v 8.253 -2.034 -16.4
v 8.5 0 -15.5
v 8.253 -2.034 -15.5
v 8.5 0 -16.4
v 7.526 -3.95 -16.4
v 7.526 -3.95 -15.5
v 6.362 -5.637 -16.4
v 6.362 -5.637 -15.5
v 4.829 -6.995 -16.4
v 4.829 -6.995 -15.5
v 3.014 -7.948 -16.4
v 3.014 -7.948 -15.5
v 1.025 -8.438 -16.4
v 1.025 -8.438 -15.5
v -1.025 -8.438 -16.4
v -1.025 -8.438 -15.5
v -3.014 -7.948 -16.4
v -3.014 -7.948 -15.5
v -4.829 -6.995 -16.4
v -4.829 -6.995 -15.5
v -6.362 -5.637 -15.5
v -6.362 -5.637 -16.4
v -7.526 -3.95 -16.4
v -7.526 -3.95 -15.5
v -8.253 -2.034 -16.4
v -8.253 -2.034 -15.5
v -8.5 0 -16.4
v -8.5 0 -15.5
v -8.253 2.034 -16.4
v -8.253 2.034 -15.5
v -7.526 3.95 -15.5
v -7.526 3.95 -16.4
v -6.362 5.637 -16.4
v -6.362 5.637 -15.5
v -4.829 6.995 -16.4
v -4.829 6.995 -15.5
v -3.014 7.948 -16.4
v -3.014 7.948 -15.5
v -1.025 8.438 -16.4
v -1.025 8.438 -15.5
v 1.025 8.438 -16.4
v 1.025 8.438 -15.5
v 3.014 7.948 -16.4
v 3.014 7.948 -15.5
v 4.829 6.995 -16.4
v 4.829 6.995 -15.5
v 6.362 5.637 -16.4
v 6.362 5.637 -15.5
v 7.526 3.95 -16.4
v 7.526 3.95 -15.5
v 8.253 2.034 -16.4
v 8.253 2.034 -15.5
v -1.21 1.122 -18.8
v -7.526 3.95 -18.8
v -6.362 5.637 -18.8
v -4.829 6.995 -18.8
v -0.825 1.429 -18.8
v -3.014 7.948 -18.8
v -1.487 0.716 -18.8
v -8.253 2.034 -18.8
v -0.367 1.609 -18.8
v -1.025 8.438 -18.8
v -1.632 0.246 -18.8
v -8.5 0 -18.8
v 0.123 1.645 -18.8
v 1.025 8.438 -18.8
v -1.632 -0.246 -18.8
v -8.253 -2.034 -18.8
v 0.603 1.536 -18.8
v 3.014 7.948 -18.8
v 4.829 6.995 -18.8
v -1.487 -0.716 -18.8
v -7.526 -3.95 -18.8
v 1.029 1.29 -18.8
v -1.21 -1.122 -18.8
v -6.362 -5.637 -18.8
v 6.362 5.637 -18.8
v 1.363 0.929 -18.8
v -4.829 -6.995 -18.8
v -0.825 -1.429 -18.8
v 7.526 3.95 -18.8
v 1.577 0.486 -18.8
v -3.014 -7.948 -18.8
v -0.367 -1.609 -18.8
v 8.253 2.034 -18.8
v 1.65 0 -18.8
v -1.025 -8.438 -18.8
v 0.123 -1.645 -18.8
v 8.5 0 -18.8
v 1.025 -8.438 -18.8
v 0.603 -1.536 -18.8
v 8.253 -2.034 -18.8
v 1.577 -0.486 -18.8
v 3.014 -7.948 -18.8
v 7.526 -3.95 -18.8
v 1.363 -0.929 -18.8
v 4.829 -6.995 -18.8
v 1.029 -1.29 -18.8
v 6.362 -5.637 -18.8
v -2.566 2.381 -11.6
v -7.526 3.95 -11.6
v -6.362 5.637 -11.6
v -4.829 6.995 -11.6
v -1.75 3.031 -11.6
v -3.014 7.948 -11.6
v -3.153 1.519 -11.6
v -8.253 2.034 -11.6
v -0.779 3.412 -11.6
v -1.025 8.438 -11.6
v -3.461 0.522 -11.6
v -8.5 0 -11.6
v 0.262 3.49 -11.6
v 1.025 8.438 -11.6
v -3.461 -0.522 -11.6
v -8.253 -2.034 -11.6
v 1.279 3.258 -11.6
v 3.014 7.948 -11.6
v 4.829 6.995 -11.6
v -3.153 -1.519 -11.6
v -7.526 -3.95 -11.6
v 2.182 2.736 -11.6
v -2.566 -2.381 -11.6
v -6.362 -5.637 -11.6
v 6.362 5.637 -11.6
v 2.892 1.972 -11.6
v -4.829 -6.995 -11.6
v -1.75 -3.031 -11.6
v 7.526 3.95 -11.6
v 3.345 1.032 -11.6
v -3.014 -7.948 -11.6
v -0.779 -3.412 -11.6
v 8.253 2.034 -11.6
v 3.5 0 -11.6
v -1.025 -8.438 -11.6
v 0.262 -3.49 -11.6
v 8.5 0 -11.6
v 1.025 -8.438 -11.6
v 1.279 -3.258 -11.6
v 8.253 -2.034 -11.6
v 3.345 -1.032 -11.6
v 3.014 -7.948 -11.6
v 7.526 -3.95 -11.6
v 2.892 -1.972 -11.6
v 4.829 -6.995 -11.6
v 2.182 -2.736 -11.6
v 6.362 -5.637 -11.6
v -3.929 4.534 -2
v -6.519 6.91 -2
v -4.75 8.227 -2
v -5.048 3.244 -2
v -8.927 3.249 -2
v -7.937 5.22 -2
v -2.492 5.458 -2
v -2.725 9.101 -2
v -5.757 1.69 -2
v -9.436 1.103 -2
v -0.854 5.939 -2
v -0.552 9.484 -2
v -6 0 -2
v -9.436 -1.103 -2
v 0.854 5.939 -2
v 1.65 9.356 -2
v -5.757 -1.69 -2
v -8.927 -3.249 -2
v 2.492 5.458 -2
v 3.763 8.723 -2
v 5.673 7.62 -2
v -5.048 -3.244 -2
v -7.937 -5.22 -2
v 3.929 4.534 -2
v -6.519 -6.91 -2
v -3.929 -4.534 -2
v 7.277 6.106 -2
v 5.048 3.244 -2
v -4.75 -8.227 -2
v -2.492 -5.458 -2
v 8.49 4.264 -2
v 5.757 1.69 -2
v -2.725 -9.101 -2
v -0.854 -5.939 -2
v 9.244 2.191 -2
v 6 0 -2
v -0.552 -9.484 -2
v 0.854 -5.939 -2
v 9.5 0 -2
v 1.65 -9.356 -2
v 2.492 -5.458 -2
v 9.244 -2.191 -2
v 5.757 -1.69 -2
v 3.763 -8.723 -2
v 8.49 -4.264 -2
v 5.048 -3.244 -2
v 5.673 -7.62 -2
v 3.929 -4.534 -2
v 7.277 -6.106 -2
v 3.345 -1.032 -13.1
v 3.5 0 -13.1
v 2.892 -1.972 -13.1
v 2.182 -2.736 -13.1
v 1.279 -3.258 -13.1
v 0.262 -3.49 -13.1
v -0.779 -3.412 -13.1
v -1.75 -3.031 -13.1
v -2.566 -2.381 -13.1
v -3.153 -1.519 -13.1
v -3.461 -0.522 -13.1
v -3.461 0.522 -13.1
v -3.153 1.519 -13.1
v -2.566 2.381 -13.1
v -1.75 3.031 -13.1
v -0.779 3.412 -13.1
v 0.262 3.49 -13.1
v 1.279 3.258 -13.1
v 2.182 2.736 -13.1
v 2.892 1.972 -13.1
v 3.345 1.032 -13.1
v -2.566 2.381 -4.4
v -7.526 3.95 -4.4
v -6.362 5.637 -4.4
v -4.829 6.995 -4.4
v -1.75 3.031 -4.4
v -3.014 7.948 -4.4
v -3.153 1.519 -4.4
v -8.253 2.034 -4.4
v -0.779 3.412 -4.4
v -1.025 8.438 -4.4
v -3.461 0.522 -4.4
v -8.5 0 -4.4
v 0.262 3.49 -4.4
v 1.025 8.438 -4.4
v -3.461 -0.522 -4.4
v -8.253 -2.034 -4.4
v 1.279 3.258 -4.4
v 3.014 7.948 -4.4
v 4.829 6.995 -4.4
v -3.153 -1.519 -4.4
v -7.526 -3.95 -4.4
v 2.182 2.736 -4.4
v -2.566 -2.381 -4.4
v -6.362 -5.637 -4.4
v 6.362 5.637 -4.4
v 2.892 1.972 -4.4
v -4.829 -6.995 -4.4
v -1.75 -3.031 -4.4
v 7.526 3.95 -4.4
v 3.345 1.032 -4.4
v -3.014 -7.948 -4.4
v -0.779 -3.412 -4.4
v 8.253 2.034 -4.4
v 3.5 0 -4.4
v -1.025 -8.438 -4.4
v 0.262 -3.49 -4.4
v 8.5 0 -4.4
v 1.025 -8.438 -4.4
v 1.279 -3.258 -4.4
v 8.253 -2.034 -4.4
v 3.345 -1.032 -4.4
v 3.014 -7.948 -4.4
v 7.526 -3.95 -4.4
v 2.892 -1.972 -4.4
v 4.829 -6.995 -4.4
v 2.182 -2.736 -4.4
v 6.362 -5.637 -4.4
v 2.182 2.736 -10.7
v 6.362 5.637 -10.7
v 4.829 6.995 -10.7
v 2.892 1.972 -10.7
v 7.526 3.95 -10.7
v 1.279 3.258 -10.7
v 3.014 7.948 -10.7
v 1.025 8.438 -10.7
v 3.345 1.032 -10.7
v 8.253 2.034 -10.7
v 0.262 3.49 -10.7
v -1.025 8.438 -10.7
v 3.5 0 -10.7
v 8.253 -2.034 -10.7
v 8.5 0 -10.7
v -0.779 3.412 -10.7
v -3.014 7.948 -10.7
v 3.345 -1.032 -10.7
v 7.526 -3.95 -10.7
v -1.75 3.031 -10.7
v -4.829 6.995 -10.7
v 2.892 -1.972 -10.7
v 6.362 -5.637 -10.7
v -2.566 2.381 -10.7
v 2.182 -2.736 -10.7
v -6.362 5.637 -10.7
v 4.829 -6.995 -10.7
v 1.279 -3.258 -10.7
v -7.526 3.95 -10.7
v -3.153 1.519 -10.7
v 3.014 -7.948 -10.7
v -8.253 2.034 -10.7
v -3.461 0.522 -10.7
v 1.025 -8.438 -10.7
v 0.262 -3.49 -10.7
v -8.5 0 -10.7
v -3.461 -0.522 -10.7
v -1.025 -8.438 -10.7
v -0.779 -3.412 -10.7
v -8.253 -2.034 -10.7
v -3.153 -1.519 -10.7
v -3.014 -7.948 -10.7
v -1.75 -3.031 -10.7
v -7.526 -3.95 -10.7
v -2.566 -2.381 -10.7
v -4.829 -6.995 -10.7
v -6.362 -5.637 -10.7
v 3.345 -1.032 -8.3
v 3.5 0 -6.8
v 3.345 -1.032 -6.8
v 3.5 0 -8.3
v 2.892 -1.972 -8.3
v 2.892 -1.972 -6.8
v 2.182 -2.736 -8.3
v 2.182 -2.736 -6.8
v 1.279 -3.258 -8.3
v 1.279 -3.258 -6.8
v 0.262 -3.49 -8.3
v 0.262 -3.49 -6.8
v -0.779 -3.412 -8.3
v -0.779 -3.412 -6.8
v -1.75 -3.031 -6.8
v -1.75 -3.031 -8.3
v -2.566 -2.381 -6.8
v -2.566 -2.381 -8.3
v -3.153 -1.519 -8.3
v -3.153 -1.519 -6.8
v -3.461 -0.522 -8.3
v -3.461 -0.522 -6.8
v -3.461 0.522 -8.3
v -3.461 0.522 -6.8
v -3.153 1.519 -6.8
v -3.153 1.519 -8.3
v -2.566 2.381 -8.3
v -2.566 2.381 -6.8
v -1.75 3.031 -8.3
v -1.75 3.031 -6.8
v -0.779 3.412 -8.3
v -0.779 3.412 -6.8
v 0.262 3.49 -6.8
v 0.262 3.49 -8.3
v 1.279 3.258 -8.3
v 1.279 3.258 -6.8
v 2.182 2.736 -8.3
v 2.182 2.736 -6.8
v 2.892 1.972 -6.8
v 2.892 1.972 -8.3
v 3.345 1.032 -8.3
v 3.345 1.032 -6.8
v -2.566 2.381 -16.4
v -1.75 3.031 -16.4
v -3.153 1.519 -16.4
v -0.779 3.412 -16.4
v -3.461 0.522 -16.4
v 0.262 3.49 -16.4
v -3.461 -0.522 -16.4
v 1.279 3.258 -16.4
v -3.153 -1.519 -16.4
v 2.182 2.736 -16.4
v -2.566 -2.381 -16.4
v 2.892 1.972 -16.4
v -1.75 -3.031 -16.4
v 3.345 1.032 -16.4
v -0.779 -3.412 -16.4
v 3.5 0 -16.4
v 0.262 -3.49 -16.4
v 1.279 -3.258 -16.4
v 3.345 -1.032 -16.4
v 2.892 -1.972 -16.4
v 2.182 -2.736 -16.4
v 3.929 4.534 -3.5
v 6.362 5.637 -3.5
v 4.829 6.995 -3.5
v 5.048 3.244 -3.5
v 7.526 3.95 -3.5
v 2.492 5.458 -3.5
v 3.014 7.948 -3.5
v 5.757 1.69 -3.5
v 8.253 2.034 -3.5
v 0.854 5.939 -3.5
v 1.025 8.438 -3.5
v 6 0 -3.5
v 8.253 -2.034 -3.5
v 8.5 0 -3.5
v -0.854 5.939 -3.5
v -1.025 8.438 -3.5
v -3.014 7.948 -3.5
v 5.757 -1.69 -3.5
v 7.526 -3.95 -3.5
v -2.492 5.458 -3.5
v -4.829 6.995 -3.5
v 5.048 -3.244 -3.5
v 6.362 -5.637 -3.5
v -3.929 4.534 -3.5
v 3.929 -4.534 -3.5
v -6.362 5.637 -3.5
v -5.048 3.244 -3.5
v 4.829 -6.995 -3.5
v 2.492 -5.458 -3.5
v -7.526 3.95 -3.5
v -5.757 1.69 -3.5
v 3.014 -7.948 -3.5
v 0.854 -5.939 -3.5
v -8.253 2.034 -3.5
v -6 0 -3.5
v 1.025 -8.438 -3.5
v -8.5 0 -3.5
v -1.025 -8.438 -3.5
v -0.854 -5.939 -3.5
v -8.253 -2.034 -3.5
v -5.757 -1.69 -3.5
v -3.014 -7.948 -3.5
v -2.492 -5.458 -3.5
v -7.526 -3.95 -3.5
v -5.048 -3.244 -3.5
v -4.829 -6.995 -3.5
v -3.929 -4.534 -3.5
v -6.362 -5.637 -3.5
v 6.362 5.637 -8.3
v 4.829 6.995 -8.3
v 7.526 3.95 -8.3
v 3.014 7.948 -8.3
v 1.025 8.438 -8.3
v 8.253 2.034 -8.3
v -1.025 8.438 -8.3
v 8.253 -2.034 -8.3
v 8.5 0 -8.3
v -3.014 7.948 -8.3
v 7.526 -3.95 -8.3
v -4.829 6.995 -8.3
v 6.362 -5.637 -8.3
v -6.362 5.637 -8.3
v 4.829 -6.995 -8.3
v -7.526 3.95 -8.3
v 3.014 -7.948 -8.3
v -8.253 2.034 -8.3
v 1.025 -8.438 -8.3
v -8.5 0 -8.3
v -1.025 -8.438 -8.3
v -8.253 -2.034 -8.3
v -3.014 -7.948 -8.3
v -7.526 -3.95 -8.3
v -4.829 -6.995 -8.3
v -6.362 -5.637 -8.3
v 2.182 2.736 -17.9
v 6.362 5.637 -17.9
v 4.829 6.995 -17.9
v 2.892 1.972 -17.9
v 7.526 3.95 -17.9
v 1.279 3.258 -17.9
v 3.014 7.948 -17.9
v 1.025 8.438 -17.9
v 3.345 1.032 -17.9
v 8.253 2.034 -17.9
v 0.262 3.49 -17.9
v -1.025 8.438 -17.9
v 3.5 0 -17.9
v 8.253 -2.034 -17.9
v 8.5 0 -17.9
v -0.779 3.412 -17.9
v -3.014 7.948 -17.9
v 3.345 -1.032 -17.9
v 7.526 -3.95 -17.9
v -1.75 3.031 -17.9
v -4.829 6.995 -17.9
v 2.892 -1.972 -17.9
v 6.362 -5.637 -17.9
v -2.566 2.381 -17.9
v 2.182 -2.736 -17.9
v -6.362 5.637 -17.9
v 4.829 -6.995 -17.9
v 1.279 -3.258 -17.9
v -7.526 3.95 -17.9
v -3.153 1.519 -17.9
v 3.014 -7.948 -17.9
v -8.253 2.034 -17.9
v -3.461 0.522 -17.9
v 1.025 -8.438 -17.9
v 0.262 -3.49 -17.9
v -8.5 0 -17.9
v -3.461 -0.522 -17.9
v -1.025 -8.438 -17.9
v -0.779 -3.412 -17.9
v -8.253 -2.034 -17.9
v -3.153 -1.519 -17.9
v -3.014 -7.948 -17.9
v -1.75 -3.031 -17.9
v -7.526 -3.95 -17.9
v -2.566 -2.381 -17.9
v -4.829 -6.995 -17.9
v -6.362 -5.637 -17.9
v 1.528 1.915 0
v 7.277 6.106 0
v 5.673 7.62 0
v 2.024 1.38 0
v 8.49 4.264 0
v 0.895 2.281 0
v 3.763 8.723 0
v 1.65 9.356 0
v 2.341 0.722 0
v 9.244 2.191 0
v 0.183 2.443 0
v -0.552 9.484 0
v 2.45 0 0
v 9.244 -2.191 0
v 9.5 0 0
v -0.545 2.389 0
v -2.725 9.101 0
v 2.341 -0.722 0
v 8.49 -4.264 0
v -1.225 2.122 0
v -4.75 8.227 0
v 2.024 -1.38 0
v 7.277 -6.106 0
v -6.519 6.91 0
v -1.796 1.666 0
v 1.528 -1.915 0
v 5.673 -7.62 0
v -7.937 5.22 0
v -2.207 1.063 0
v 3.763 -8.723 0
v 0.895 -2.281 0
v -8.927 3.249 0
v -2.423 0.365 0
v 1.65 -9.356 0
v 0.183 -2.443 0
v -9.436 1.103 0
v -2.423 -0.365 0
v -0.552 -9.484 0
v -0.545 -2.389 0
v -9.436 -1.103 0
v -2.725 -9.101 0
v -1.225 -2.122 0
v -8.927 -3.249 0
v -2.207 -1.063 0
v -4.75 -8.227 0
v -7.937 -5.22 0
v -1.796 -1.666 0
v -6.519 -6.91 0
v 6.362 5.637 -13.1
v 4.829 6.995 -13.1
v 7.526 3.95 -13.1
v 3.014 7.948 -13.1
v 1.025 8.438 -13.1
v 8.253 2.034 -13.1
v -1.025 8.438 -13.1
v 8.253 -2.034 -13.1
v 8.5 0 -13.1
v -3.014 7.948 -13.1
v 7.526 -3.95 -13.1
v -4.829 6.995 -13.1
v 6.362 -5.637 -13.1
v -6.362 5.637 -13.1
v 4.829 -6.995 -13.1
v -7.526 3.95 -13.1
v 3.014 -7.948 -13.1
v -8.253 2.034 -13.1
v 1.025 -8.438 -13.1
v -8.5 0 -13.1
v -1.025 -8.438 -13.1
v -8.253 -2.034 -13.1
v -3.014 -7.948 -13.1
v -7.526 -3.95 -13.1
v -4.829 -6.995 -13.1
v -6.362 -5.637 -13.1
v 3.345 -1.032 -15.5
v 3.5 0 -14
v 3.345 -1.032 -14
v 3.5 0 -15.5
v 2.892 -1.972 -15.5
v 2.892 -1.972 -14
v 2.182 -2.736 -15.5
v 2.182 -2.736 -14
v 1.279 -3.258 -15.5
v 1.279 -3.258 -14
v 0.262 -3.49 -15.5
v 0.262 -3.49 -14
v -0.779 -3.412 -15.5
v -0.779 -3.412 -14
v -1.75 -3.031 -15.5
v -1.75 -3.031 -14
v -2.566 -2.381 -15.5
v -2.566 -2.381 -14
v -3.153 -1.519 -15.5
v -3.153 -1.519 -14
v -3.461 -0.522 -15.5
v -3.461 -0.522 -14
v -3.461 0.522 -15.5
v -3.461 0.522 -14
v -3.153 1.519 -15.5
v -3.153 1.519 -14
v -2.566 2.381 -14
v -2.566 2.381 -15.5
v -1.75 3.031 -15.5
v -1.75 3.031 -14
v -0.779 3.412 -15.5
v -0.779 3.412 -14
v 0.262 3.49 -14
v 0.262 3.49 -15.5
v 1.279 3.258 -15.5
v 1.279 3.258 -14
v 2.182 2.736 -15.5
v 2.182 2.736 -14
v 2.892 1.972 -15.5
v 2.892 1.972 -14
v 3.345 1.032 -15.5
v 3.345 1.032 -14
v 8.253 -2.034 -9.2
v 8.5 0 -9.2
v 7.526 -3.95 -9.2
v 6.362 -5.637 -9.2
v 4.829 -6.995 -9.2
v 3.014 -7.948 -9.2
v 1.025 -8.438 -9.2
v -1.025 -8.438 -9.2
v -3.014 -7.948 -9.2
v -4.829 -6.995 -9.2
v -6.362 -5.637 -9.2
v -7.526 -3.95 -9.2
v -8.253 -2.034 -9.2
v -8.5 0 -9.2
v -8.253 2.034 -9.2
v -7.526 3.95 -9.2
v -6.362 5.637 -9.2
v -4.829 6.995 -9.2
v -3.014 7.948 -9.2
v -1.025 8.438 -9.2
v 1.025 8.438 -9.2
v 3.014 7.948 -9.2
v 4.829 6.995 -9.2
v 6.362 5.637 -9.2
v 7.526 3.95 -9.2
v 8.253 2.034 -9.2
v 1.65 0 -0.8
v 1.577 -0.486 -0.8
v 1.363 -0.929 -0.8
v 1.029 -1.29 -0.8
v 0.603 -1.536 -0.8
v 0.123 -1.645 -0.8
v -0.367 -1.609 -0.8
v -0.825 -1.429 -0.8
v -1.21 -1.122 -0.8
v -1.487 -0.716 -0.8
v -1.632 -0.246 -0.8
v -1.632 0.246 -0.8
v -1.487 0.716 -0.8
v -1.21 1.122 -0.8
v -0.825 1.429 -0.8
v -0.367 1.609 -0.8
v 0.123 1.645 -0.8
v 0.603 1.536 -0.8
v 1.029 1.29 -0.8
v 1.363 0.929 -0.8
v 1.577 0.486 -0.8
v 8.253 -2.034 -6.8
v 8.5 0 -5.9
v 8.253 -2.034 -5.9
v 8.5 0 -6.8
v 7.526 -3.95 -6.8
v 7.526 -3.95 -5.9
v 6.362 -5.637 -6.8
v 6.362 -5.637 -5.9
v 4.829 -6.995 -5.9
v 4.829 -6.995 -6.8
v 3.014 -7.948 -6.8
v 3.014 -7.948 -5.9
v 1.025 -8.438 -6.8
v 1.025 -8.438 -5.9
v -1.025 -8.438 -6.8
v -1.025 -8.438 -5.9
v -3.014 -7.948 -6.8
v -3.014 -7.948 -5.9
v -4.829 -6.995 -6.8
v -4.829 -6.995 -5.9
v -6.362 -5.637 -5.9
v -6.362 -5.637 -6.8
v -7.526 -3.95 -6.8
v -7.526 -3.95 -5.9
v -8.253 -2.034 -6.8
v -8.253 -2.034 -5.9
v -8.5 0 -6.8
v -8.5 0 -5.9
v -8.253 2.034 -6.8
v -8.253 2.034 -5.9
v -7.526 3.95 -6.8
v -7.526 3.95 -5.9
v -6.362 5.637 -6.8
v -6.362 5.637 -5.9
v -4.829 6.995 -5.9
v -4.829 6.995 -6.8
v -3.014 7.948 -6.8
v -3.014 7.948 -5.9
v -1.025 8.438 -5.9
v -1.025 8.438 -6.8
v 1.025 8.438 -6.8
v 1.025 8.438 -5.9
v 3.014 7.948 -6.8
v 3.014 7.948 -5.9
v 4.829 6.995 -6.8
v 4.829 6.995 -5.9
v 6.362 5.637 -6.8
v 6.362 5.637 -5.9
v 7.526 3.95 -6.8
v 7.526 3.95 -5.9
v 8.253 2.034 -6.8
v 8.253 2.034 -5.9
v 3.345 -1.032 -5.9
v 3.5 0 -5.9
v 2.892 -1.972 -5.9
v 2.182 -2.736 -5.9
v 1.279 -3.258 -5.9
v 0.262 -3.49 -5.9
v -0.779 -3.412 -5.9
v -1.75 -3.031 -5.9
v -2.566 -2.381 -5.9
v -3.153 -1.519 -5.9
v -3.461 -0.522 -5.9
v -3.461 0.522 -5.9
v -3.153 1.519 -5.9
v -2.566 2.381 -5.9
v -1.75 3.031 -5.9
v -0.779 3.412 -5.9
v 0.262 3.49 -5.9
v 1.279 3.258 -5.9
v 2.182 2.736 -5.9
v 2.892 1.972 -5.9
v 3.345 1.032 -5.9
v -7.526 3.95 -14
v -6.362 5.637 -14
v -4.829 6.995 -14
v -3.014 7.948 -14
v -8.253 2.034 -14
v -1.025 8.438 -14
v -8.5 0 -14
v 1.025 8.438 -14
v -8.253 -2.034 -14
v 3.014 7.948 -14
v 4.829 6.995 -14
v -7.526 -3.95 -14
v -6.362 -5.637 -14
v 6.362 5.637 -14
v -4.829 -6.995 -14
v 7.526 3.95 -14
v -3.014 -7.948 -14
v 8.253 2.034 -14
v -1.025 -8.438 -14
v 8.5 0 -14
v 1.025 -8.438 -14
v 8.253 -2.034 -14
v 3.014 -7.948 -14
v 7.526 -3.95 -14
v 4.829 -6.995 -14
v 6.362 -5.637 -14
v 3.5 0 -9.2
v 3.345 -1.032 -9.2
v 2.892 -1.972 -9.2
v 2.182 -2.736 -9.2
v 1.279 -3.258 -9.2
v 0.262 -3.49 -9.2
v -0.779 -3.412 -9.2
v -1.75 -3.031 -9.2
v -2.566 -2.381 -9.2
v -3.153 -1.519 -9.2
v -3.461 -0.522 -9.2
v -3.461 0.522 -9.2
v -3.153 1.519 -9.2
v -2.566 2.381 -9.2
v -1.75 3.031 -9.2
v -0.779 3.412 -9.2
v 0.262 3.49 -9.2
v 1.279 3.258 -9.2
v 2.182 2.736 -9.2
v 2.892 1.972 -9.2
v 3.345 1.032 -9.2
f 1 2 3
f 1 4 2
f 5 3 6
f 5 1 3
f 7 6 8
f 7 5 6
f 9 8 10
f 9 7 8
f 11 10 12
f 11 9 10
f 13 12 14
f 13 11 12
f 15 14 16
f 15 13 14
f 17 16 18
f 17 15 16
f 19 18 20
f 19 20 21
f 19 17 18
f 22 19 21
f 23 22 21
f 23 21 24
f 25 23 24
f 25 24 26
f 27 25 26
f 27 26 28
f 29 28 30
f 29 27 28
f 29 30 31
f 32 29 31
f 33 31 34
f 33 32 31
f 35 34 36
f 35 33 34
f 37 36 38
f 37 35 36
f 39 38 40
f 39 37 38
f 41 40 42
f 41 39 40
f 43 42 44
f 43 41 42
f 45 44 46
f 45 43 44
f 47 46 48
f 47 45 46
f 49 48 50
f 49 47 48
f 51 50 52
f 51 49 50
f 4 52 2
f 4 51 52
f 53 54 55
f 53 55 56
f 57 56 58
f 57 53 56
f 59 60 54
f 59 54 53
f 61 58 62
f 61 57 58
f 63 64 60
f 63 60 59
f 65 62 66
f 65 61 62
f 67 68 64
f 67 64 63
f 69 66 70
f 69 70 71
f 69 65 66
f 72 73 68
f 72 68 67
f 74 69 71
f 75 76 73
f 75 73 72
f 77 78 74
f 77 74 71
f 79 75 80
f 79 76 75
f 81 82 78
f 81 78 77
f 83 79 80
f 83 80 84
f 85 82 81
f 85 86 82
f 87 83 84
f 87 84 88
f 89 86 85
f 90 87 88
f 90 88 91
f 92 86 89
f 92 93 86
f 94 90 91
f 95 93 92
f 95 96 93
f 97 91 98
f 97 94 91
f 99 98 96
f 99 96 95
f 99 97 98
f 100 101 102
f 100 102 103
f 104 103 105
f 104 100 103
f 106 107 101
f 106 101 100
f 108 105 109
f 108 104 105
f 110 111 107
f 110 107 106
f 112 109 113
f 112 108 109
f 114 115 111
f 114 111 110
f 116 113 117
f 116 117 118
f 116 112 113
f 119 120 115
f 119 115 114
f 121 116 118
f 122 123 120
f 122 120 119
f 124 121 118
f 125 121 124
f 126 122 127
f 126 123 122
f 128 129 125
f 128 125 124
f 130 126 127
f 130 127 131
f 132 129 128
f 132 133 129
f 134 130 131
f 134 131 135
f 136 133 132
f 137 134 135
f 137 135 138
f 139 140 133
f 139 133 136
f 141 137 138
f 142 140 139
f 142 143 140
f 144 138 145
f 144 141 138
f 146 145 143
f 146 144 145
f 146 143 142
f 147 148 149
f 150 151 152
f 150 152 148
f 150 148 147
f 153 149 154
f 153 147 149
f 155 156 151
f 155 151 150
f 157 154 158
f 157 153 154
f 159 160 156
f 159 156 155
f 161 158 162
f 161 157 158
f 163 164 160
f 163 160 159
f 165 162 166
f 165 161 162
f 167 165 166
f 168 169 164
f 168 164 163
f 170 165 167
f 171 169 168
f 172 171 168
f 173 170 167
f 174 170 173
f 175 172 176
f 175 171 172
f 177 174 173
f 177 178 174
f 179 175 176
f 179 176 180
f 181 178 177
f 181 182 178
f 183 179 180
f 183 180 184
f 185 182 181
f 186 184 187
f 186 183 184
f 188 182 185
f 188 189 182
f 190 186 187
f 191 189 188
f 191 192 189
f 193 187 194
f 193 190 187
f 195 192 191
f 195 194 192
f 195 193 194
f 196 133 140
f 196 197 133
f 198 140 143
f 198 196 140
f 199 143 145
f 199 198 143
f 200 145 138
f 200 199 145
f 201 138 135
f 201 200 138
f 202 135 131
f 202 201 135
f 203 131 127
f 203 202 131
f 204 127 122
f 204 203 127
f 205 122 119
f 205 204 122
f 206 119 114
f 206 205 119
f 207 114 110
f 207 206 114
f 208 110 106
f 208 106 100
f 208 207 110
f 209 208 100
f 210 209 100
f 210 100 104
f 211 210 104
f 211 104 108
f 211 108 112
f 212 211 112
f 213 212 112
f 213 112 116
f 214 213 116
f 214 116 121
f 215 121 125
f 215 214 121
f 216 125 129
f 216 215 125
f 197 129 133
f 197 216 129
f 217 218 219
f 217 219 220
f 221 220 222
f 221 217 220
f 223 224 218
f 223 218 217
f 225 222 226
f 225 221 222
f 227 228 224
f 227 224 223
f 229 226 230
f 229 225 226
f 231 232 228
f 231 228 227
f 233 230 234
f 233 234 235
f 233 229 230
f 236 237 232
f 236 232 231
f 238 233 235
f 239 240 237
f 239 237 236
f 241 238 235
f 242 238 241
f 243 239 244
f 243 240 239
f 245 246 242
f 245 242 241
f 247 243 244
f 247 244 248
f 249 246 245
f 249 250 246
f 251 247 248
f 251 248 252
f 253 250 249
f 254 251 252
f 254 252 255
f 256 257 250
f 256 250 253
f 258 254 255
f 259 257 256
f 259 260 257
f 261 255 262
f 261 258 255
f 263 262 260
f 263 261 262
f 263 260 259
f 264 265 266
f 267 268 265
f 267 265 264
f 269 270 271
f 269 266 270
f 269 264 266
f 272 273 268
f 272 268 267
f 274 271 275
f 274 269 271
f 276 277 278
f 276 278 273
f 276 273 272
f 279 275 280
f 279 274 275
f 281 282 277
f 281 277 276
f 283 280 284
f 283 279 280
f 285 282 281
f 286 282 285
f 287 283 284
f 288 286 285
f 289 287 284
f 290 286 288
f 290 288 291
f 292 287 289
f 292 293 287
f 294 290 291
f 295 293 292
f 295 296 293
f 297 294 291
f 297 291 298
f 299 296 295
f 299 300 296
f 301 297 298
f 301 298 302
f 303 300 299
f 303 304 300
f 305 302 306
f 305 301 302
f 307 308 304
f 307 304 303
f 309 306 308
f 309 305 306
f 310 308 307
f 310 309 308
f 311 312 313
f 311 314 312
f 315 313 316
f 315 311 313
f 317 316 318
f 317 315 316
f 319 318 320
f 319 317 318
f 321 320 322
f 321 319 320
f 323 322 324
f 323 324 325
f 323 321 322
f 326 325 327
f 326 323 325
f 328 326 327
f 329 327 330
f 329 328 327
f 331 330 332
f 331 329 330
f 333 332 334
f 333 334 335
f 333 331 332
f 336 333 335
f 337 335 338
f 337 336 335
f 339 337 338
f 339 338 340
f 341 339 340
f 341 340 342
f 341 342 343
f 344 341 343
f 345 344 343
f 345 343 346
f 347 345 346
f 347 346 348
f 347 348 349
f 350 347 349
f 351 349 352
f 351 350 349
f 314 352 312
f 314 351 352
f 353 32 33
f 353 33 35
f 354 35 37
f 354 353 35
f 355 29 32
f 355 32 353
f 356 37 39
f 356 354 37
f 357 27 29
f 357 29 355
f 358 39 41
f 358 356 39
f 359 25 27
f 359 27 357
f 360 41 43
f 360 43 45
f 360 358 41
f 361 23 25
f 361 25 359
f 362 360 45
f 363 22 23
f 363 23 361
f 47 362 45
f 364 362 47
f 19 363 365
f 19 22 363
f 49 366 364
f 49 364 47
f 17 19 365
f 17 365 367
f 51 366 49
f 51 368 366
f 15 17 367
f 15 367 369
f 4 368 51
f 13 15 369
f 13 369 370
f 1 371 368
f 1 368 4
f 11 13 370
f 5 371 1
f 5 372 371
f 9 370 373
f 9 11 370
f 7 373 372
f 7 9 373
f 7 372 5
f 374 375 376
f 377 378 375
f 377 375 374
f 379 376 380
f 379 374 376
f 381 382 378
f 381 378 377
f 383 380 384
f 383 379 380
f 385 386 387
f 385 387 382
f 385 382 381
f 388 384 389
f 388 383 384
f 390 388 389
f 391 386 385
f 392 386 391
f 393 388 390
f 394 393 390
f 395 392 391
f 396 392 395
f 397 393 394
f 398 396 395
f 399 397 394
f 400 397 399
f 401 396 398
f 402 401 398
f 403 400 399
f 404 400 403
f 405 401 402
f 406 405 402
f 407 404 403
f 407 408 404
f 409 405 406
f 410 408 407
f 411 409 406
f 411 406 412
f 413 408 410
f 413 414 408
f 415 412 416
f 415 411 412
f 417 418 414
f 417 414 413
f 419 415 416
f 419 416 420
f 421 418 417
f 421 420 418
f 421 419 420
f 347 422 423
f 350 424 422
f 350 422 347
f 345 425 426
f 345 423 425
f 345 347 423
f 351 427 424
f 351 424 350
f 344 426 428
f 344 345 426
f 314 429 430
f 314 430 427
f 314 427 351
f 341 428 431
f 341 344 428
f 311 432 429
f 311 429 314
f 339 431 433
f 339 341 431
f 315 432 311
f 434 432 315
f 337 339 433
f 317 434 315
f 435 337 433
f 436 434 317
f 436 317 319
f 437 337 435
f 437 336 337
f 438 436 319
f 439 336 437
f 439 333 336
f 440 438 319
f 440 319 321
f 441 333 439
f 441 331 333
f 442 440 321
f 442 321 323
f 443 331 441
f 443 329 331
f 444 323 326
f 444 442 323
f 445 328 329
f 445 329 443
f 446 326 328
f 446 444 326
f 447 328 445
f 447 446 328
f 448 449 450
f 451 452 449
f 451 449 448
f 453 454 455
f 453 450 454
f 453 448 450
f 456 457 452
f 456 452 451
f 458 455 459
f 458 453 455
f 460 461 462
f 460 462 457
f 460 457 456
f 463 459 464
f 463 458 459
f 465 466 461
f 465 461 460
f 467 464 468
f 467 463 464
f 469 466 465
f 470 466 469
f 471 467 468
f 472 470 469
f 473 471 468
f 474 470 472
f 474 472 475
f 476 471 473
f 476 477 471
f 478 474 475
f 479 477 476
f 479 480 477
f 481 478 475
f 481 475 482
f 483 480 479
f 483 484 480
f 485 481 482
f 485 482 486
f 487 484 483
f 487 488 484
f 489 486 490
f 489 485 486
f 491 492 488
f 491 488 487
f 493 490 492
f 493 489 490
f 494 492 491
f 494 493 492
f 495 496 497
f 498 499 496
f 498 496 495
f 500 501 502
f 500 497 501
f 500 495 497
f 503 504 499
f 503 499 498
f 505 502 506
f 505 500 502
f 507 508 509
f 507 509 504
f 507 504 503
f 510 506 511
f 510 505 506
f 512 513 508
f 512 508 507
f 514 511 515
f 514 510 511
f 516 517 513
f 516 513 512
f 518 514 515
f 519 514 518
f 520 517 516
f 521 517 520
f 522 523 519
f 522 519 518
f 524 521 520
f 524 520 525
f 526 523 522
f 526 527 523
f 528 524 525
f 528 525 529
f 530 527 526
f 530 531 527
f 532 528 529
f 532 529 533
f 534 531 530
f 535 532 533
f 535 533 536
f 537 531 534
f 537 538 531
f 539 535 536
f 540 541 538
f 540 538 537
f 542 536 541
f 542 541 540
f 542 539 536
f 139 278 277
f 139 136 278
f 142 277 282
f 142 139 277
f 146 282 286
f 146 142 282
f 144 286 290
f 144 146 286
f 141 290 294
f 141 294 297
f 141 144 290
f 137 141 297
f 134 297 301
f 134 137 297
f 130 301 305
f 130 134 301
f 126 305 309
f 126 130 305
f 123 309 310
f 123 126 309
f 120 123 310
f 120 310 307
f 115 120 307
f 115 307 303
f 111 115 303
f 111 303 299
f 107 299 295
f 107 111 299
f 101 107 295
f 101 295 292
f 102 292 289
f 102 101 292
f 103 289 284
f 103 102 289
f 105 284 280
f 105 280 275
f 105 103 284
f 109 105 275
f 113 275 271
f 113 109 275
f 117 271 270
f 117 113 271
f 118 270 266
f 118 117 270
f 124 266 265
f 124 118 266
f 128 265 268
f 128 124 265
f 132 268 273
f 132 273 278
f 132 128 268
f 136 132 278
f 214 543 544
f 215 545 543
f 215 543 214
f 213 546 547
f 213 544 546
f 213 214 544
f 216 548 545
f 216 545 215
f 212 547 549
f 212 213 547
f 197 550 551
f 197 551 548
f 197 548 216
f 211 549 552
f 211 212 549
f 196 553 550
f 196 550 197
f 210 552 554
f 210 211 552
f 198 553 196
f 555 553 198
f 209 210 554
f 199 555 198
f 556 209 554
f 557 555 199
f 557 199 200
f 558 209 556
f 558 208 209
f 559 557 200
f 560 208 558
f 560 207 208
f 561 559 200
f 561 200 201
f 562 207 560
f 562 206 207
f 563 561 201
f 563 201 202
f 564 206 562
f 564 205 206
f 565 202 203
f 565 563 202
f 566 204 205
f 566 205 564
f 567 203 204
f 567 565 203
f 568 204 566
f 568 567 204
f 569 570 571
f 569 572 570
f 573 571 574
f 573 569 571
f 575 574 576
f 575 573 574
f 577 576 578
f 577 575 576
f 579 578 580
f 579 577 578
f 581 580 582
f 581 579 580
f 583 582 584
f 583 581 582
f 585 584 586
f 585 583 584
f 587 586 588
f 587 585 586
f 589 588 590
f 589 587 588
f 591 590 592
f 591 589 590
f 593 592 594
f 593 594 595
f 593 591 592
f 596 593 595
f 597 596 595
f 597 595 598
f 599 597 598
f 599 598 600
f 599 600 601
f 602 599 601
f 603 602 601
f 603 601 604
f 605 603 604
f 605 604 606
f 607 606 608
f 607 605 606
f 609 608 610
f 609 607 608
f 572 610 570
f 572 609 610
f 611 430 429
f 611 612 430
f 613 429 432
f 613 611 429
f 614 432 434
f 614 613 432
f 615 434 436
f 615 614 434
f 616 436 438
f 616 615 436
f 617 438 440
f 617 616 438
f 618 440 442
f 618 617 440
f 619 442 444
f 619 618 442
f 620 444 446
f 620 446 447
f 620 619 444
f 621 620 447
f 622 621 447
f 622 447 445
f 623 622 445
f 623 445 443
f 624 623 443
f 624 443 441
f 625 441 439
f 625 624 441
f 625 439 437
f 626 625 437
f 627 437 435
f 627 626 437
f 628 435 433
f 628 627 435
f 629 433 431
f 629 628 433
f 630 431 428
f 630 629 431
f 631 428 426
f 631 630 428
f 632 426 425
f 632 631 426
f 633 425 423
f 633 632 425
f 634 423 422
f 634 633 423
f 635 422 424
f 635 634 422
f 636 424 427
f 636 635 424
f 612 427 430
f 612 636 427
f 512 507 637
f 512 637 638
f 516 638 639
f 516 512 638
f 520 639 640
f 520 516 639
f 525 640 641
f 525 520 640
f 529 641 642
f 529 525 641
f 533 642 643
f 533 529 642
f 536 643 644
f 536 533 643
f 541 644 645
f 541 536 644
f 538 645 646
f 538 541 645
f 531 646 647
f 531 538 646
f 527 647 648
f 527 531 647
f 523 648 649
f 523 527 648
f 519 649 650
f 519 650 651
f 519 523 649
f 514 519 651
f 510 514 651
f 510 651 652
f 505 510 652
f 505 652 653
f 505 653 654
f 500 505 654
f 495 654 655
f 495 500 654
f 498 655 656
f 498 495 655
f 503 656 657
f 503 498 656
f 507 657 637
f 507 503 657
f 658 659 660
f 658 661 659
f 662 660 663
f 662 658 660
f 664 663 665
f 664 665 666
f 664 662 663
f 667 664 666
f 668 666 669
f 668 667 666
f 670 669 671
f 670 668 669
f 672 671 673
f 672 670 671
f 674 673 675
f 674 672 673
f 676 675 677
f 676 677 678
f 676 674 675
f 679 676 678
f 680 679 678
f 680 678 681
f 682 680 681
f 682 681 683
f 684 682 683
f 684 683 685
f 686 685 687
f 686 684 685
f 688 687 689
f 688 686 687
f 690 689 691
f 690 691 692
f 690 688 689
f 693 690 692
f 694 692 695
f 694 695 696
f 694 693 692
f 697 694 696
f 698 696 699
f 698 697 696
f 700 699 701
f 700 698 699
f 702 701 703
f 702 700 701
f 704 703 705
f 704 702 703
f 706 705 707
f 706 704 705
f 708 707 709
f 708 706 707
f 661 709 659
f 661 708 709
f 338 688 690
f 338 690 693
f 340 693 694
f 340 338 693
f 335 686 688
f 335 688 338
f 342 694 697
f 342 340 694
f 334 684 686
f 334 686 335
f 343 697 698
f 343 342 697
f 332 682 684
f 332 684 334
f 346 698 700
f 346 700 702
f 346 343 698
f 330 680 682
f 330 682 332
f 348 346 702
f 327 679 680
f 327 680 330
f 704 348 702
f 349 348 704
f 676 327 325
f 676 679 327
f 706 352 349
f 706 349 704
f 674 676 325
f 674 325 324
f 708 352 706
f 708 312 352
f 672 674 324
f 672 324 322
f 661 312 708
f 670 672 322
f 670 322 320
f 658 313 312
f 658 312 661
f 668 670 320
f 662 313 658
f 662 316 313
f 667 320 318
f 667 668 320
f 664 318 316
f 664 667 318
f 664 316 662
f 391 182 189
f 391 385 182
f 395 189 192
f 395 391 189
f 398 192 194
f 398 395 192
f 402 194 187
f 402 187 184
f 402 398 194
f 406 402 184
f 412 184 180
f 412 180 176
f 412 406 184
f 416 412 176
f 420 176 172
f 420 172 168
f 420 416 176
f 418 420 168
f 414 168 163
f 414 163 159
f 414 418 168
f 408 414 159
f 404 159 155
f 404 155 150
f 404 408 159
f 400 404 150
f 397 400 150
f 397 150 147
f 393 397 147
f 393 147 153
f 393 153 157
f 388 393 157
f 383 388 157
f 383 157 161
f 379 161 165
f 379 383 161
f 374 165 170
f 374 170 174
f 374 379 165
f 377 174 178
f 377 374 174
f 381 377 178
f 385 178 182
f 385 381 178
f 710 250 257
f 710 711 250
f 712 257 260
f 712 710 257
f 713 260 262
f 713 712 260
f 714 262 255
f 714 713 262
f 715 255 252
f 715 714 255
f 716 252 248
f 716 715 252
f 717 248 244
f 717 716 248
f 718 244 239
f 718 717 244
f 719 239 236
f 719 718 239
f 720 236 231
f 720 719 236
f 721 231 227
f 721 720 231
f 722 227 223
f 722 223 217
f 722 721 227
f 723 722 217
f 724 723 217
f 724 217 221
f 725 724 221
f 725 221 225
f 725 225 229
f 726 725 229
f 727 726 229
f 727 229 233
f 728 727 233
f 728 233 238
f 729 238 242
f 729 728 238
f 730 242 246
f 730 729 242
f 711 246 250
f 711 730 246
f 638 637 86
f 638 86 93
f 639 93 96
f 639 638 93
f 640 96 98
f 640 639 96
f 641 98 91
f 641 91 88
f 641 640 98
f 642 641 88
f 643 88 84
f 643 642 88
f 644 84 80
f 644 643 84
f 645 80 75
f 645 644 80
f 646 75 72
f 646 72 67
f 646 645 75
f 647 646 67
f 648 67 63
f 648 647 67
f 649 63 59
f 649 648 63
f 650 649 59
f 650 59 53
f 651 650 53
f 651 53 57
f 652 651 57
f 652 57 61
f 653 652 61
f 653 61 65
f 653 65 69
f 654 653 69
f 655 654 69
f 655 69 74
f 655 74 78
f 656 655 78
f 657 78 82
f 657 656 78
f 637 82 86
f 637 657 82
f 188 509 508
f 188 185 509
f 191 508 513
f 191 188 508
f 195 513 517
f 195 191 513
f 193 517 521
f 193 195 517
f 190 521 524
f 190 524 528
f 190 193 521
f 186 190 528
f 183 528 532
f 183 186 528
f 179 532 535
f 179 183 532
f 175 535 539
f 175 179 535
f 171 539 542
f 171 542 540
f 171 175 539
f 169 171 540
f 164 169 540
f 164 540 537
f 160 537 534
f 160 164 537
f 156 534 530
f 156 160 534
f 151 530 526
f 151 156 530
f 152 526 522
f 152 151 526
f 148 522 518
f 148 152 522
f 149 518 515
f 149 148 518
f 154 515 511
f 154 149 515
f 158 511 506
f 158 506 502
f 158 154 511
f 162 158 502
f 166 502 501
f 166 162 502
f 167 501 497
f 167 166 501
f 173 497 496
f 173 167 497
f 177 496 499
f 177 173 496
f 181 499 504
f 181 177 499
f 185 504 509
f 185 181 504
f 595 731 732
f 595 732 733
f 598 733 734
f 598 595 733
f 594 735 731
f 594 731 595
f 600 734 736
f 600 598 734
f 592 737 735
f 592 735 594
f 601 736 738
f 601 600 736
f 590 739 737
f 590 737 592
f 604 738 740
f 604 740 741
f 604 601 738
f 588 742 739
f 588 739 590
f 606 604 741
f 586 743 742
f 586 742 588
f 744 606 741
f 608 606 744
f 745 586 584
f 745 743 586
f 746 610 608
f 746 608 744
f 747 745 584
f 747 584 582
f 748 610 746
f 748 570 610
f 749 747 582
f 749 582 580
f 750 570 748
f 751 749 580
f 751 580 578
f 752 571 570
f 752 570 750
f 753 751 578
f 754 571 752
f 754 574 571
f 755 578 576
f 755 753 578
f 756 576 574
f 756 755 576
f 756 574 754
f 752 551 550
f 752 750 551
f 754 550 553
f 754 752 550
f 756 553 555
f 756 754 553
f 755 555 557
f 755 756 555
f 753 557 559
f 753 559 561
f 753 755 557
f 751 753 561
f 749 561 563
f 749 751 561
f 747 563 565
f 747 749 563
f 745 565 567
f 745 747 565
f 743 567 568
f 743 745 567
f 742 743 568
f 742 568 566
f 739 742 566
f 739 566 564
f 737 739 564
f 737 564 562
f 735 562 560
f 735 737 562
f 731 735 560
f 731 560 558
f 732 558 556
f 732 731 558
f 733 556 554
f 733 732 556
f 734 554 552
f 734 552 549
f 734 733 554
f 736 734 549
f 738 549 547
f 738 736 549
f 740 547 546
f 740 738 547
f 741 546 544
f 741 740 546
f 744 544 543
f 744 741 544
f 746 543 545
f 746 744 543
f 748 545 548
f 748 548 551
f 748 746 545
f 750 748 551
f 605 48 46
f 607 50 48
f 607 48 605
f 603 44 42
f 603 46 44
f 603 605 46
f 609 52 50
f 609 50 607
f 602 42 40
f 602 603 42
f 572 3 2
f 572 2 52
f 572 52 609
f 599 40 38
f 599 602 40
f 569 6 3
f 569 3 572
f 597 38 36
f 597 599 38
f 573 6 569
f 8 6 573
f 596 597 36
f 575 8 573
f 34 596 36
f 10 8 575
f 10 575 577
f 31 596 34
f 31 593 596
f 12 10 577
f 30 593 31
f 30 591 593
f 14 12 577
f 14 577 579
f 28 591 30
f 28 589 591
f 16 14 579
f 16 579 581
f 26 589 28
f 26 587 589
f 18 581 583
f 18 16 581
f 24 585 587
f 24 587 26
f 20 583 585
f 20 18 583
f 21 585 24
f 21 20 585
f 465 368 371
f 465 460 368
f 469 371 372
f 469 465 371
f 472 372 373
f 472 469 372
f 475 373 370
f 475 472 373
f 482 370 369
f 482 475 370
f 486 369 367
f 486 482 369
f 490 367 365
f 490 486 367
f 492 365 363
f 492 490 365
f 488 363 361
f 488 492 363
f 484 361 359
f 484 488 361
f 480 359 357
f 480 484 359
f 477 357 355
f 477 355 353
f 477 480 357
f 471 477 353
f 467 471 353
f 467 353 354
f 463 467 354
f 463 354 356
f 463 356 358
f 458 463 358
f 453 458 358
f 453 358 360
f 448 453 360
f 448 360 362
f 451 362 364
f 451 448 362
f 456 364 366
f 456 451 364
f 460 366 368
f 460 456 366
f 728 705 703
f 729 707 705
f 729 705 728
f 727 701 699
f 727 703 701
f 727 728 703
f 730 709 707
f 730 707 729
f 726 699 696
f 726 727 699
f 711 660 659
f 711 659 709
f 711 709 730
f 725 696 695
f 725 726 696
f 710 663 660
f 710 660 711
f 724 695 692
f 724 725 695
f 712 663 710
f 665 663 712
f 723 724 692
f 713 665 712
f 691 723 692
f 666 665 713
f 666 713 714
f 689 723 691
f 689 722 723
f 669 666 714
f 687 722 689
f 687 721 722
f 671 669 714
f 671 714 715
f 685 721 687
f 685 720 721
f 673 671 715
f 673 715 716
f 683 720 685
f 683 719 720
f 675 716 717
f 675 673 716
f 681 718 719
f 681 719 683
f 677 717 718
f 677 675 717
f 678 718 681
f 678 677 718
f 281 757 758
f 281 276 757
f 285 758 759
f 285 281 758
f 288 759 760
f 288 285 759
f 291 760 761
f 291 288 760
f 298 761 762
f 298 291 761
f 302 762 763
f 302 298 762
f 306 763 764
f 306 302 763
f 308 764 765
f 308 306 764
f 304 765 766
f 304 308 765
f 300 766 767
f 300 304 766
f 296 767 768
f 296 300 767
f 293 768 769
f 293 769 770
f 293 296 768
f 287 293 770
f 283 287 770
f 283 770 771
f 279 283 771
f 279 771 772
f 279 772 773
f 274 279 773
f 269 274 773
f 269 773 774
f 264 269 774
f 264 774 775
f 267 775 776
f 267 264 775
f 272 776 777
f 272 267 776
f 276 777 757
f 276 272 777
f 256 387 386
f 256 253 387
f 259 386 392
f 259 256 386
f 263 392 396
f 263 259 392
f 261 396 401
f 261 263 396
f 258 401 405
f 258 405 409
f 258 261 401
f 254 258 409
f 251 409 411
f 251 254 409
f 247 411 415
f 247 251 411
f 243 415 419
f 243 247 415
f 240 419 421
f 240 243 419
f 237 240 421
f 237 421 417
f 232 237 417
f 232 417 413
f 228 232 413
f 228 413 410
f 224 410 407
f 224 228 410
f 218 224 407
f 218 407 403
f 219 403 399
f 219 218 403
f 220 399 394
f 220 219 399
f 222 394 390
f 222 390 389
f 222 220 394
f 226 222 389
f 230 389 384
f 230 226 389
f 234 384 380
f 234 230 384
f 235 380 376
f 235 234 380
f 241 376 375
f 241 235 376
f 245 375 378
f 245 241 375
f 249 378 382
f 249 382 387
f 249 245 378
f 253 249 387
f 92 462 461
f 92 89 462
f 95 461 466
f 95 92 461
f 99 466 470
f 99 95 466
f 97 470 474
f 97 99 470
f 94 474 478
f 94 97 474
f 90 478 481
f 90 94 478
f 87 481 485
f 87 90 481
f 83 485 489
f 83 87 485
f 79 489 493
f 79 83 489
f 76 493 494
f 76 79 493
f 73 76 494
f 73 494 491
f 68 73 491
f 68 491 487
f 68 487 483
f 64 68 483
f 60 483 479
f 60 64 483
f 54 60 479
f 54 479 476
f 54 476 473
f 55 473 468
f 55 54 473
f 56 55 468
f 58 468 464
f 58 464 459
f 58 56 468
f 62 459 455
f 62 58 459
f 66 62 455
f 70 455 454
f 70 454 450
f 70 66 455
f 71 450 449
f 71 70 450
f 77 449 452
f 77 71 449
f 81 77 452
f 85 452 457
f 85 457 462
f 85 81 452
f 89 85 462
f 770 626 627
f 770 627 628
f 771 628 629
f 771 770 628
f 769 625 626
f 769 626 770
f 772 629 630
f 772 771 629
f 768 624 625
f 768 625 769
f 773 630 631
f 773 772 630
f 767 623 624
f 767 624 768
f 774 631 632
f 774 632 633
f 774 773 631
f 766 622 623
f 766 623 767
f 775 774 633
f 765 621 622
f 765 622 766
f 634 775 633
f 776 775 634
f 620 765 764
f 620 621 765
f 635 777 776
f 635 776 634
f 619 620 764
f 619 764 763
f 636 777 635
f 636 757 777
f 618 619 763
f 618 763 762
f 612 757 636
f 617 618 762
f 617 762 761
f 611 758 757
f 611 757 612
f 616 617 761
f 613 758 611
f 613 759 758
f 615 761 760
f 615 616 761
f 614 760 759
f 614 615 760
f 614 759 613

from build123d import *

# Parameters (mm, degrees)
CHAMFER1_SIZE = 0.8


with BuildPart() as part:
    # Sketch2 → Revolve1 (revolve)
    with BuildSketch(Plane(origin=(0, 0, 0), x_dir=(1, 0, 0), z_dir=(0, 1, 0))):
        Polygon((1.65, 18.8), (1.65, 0), (9.5, 0), (9.5, 2), (6, 2), (6, 3.5), (8.5, 3.5), (8.5, 4.4), (3.5, 4.4), (3.5, 5.9), (8.5, 5.9), (8.5, 6.8), (3.5, 6.8), (3.5, 8.3), (8.5, 8.3), (8.5, 9.2), (3.5, 9.2), (3.5, 10.7), (8.5, 10.7), (8.5, 11.6), (3.5, 11.6), (3.5, 13.1), (8.5, 13.1), (8.5, 14), (3.5, 14), (3.5, 15.5), (8.5, 15.5), (8.5, 16.4), (3.5, 16.4), (3.5, 17.9), (8.5, 17.9), (8.5, 18.8), align=None)
    revolve(axis=Axis((0, 0, 0), (0, 0, -1)))

    # Chamfer1
    chamfer1_edges = [part.edges().sort_by_distance(p)[0] for p in [
        (-1.65, 0, 0),
    ]]
    chamfer(chamfer1_edges, length=CHAMFER1_SIZE)


solid = part.part
